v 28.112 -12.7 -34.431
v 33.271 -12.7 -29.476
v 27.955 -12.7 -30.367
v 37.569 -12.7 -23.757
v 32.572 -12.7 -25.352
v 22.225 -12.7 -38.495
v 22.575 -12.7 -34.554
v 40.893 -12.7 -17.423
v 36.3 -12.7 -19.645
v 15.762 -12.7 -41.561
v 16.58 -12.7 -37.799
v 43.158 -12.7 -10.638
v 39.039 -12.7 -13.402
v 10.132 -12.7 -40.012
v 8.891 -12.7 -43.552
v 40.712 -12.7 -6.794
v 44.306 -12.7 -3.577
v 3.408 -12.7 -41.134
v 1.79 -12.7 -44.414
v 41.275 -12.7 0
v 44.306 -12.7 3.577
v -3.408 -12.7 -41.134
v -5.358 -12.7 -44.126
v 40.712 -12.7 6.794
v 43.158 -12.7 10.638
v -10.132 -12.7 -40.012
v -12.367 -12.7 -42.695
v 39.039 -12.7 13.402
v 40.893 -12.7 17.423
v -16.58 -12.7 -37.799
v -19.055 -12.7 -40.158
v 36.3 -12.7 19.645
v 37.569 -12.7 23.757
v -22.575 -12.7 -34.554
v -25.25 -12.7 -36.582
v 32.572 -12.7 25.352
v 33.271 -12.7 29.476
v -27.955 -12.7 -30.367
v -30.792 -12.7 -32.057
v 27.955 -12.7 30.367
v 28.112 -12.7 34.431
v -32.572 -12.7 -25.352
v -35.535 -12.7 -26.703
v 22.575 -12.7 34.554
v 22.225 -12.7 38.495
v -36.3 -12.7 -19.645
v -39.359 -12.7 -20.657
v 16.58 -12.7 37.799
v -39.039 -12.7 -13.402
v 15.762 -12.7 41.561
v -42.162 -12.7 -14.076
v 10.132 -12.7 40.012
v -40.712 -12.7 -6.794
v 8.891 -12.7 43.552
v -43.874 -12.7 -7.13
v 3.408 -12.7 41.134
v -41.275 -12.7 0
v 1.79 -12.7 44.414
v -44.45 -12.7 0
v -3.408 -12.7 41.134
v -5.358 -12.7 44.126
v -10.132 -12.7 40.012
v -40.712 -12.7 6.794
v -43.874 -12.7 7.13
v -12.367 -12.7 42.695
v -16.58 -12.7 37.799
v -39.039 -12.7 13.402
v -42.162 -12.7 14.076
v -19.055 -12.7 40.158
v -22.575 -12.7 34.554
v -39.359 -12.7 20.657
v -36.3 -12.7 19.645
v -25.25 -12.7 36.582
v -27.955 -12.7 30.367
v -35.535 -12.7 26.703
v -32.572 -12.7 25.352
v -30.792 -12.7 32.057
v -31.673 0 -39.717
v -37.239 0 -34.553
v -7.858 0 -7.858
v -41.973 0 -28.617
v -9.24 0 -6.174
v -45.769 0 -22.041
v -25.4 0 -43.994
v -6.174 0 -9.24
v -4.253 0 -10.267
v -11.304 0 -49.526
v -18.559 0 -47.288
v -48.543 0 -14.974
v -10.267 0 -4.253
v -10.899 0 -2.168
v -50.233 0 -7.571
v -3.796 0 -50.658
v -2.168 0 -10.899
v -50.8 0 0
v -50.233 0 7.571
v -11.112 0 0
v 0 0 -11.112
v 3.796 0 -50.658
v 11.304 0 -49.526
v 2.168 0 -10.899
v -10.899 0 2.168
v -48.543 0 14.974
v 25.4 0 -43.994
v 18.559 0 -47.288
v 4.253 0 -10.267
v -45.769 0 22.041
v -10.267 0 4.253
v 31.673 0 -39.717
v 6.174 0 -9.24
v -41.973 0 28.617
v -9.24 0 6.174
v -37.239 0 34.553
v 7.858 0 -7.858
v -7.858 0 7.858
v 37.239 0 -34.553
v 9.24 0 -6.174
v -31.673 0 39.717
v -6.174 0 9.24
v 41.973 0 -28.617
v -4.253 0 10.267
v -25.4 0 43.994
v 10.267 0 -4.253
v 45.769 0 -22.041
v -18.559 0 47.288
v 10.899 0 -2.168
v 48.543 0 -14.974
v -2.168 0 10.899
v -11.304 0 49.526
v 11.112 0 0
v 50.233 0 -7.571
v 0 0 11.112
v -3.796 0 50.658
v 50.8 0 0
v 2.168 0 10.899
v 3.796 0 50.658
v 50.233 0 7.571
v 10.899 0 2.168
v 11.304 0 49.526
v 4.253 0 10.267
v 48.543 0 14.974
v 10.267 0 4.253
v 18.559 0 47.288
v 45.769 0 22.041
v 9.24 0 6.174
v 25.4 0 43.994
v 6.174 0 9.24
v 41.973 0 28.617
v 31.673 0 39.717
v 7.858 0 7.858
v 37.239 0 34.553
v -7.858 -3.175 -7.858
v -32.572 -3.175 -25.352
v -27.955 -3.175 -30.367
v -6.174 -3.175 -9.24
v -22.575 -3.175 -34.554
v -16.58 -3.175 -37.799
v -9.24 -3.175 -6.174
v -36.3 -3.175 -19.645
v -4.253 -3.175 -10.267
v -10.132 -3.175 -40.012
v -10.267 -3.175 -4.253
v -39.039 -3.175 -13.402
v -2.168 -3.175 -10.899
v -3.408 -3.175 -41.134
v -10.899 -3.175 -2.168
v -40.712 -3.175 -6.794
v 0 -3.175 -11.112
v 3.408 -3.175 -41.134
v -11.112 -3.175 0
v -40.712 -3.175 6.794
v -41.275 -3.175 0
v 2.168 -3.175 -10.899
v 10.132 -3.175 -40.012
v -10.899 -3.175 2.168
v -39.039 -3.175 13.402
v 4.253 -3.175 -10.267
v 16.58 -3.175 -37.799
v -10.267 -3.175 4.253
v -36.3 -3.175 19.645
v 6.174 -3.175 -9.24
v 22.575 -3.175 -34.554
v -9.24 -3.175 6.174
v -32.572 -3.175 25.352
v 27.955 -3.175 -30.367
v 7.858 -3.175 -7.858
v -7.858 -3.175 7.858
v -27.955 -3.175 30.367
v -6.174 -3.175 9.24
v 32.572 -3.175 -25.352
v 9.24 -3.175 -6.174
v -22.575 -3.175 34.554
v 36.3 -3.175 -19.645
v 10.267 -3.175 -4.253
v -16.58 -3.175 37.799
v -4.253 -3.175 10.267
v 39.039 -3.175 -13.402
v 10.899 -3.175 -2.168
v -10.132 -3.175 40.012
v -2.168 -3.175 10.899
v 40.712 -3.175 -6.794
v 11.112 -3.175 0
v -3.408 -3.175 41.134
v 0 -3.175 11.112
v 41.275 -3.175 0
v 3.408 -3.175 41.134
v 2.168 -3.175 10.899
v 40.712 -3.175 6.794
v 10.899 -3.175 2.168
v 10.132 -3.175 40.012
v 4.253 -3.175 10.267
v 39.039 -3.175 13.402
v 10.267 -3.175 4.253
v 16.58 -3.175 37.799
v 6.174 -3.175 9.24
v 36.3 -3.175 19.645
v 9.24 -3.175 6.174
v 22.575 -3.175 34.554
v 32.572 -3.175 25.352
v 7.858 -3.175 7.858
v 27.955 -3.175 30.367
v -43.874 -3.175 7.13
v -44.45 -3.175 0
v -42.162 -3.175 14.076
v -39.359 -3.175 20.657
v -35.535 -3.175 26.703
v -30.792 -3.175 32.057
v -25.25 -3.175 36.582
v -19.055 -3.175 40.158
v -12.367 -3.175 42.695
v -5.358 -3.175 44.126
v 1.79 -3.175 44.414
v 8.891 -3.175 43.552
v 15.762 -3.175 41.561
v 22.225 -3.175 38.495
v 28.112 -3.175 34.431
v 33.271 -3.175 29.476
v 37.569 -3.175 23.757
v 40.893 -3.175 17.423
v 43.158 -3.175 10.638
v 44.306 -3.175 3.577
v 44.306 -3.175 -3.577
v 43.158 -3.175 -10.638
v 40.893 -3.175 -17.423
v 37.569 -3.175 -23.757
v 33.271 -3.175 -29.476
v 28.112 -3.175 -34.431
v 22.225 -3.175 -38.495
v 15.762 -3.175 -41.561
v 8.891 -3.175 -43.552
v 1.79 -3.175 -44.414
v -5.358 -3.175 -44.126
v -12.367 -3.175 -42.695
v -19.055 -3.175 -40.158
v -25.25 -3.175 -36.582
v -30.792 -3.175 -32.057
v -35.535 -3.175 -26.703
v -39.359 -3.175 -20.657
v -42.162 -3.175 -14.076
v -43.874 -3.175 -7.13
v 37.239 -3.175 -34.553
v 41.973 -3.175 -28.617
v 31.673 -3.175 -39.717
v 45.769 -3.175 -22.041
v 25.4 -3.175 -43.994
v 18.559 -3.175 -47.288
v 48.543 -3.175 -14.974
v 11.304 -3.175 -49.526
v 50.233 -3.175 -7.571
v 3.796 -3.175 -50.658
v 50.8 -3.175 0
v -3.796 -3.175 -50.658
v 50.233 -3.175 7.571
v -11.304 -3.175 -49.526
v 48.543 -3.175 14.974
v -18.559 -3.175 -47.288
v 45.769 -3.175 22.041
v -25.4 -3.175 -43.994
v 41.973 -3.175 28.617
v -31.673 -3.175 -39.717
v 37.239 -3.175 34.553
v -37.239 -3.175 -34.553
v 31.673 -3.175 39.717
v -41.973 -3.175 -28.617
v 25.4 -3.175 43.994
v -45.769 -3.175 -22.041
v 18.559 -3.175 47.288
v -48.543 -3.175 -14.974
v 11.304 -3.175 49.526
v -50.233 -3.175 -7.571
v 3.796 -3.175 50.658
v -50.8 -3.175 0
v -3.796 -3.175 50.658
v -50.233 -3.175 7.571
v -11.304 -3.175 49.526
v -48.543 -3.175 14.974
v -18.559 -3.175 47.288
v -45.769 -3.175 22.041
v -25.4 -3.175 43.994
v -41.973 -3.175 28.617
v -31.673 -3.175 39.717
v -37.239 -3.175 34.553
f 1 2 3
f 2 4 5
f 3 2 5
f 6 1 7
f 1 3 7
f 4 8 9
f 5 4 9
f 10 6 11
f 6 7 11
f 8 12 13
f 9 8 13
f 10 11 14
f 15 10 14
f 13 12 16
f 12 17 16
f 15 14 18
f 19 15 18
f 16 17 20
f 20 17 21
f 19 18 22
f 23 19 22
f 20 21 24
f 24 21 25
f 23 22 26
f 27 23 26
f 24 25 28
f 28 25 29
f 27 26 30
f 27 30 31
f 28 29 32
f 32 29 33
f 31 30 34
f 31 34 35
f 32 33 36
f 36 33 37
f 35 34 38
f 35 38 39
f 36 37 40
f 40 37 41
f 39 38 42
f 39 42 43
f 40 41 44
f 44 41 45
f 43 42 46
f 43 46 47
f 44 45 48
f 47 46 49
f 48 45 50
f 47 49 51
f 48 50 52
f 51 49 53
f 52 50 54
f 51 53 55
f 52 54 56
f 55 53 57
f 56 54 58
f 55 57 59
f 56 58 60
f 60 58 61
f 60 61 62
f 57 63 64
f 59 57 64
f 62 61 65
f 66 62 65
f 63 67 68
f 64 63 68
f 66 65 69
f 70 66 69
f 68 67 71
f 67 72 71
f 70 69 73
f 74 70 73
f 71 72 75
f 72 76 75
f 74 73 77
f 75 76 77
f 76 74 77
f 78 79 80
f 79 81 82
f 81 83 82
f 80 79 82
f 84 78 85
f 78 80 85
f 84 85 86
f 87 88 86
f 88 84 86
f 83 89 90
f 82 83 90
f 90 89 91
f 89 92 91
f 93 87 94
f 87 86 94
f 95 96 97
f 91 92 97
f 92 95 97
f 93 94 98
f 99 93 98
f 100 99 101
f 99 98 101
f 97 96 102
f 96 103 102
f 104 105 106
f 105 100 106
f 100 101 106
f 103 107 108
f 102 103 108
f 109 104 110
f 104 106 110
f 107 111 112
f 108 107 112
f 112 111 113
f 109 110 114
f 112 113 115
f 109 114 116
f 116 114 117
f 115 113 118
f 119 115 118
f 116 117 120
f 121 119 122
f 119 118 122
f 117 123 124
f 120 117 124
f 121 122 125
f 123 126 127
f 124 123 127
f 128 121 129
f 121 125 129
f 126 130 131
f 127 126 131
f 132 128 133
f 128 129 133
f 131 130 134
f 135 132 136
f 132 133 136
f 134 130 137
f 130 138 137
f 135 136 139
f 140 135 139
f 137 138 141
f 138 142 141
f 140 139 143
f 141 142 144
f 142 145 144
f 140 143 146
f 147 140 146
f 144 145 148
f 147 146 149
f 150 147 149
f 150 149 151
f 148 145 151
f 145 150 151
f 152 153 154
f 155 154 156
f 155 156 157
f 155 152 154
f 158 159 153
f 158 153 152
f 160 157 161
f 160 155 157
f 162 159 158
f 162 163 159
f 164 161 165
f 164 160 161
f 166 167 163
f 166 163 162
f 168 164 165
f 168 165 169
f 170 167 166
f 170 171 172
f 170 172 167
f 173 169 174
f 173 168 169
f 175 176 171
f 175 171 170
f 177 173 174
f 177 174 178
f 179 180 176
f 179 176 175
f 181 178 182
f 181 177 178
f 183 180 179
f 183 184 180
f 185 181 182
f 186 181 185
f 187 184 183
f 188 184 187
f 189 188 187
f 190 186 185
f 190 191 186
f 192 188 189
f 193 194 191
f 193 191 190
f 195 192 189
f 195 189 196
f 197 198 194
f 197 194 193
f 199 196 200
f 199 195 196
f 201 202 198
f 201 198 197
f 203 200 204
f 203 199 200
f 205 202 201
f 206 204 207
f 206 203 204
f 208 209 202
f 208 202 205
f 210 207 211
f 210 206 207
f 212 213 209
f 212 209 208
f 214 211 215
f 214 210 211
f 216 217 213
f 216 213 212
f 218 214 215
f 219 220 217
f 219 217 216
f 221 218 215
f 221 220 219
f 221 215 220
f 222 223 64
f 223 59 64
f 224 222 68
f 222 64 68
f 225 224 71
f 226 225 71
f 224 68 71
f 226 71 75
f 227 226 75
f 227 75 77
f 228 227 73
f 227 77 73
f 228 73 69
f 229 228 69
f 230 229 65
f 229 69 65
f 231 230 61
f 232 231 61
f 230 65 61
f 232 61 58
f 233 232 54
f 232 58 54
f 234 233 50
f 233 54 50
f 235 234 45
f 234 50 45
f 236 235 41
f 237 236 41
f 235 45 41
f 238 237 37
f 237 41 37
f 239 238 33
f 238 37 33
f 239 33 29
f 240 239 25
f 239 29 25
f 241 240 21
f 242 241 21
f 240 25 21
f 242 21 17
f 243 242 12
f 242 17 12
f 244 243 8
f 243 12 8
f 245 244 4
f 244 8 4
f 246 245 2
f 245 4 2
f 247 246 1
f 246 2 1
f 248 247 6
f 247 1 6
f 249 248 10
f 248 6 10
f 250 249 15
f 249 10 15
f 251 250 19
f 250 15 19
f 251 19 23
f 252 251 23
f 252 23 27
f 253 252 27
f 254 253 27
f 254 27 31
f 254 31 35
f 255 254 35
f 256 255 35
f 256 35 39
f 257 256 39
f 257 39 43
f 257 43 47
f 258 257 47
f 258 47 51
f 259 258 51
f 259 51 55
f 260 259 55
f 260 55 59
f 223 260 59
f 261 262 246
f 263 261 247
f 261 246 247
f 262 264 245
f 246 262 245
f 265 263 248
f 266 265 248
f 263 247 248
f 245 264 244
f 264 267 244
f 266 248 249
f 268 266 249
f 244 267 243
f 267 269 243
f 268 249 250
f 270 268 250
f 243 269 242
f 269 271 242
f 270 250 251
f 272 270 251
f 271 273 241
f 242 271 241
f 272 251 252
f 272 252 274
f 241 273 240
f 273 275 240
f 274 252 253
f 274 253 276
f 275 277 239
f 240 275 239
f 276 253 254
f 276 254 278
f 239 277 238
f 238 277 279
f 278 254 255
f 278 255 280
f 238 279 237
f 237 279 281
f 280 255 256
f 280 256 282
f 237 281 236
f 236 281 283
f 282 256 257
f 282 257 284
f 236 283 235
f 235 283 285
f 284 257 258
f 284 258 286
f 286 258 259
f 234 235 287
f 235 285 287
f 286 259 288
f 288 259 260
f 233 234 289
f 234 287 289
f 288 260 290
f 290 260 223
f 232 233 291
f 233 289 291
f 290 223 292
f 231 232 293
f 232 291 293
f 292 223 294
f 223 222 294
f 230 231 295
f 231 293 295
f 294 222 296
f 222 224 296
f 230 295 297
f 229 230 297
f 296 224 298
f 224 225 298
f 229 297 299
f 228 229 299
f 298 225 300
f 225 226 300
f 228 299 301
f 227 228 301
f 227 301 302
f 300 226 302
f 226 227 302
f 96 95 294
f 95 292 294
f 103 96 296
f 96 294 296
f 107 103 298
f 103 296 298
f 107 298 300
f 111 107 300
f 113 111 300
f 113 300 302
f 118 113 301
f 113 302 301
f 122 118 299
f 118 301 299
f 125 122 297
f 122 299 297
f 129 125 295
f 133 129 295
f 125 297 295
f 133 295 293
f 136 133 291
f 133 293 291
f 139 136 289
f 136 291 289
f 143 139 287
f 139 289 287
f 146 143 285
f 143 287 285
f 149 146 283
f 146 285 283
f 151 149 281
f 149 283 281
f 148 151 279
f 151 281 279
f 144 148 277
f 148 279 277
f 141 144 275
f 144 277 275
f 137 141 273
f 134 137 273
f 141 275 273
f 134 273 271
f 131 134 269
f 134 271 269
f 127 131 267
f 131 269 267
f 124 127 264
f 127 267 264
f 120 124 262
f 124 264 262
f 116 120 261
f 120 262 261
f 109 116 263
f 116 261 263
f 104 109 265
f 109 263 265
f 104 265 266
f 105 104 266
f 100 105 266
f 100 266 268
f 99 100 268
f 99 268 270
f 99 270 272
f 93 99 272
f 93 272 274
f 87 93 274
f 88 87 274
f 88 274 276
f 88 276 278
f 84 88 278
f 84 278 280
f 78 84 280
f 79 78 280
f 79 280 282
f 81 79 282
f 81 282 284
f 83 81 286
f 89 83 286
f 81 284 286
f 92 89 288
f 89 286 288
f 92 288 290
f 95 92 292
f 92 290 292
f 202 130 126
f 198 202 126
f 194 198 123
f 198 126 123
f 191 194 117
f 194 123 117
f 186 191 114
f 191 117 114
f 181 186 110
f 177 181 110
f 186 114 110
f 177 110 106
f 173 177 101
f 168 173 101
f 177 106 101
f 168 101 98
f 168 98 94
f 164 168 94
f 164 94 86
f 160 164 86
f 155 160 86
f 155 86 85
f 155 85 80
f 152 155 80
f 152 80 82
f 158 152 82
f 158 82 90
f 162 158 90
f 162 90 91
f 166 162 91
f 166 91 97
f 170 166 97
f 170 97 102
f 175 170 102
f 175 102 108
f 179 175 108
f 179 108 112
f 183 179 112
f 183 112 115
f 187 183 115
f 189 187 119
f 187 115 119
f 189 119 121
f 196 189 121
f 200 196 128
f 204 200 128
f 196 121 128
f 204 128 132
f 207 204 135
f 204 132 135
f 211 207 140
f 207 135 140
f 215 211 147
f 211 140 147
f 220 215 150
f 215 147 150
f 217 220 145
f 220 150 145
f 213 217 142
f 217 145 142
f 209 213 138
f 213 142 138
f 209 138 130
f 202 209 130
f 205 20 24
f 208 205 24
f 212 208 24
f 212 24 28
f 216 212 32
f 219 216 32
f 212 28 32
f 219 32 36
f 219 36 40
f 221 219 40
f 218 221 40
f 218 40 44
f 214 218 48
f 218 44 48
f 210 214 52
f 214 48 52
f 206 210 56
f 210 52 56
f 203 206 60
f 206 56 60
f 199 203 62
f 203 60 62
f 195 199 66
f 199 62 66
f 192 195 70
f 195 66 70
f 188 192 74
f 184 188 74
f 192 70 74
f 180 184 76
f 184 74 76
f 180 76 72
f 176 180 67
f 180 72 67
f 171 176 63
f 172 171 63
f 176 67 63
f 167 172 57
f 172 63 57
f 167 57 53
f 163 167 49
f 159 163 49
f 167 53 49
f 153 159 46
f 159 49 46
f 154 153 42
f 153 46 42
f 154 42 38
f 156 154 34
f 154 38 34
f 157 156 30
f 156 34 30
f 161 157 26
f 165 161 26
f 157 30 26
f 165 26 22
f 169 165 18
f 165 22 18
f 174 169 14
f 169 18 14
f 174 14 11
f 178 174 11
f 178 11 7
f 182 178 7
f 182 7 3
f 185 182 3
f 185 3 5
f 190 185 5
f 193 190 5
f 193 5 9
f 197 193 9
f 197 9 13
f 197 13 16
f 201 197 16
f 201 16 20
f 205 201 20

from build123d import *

# Parameters (mm, degrees)
SKETCH2_R          = 41.275
CUT_EXTRUDE1_DEPTH = 9.525
SKETCH3_R          = 11.1125
CUT_EXTRUDE2_DEPTH = 13.7


with BuildPart() as part:
    # Sketch1 → Revolve1 (revolve)
    with BuildSketch(Plane.XY):
        Polygon((0, 0), (-50.8, 0), (-50.8, -3.175), (-44.45, -3.175), (-44.45, -12.7), (0, -12.7), align=None)
    revolve(axis=Axis((0, -12.7, 0), (0, 1, 0)))

    # Sketch2 → Cut-Extrude1 (cut)
    with BuildSketch(Plane.XZ.offset(12.7)):
        Circle(SKETCH2_R)
    extrude(amount=-CUT_EXTRUDE1_DEPTH, mode=Mode.SUBTRACT)

    # Sketch3 → Cut-Extrude2 (cut, through all)
    with BuildSketch(Plane(origin=(0, 0, 0), x_dir=(1, 0, 0), z_dir=(0, 1, 0))):
        Circle(SKETCH3_R)
    extrude(amount=-CUT_EXTRUDE2_DEPTH, mode=Mode.SUBTRACT)


solid = part.part
